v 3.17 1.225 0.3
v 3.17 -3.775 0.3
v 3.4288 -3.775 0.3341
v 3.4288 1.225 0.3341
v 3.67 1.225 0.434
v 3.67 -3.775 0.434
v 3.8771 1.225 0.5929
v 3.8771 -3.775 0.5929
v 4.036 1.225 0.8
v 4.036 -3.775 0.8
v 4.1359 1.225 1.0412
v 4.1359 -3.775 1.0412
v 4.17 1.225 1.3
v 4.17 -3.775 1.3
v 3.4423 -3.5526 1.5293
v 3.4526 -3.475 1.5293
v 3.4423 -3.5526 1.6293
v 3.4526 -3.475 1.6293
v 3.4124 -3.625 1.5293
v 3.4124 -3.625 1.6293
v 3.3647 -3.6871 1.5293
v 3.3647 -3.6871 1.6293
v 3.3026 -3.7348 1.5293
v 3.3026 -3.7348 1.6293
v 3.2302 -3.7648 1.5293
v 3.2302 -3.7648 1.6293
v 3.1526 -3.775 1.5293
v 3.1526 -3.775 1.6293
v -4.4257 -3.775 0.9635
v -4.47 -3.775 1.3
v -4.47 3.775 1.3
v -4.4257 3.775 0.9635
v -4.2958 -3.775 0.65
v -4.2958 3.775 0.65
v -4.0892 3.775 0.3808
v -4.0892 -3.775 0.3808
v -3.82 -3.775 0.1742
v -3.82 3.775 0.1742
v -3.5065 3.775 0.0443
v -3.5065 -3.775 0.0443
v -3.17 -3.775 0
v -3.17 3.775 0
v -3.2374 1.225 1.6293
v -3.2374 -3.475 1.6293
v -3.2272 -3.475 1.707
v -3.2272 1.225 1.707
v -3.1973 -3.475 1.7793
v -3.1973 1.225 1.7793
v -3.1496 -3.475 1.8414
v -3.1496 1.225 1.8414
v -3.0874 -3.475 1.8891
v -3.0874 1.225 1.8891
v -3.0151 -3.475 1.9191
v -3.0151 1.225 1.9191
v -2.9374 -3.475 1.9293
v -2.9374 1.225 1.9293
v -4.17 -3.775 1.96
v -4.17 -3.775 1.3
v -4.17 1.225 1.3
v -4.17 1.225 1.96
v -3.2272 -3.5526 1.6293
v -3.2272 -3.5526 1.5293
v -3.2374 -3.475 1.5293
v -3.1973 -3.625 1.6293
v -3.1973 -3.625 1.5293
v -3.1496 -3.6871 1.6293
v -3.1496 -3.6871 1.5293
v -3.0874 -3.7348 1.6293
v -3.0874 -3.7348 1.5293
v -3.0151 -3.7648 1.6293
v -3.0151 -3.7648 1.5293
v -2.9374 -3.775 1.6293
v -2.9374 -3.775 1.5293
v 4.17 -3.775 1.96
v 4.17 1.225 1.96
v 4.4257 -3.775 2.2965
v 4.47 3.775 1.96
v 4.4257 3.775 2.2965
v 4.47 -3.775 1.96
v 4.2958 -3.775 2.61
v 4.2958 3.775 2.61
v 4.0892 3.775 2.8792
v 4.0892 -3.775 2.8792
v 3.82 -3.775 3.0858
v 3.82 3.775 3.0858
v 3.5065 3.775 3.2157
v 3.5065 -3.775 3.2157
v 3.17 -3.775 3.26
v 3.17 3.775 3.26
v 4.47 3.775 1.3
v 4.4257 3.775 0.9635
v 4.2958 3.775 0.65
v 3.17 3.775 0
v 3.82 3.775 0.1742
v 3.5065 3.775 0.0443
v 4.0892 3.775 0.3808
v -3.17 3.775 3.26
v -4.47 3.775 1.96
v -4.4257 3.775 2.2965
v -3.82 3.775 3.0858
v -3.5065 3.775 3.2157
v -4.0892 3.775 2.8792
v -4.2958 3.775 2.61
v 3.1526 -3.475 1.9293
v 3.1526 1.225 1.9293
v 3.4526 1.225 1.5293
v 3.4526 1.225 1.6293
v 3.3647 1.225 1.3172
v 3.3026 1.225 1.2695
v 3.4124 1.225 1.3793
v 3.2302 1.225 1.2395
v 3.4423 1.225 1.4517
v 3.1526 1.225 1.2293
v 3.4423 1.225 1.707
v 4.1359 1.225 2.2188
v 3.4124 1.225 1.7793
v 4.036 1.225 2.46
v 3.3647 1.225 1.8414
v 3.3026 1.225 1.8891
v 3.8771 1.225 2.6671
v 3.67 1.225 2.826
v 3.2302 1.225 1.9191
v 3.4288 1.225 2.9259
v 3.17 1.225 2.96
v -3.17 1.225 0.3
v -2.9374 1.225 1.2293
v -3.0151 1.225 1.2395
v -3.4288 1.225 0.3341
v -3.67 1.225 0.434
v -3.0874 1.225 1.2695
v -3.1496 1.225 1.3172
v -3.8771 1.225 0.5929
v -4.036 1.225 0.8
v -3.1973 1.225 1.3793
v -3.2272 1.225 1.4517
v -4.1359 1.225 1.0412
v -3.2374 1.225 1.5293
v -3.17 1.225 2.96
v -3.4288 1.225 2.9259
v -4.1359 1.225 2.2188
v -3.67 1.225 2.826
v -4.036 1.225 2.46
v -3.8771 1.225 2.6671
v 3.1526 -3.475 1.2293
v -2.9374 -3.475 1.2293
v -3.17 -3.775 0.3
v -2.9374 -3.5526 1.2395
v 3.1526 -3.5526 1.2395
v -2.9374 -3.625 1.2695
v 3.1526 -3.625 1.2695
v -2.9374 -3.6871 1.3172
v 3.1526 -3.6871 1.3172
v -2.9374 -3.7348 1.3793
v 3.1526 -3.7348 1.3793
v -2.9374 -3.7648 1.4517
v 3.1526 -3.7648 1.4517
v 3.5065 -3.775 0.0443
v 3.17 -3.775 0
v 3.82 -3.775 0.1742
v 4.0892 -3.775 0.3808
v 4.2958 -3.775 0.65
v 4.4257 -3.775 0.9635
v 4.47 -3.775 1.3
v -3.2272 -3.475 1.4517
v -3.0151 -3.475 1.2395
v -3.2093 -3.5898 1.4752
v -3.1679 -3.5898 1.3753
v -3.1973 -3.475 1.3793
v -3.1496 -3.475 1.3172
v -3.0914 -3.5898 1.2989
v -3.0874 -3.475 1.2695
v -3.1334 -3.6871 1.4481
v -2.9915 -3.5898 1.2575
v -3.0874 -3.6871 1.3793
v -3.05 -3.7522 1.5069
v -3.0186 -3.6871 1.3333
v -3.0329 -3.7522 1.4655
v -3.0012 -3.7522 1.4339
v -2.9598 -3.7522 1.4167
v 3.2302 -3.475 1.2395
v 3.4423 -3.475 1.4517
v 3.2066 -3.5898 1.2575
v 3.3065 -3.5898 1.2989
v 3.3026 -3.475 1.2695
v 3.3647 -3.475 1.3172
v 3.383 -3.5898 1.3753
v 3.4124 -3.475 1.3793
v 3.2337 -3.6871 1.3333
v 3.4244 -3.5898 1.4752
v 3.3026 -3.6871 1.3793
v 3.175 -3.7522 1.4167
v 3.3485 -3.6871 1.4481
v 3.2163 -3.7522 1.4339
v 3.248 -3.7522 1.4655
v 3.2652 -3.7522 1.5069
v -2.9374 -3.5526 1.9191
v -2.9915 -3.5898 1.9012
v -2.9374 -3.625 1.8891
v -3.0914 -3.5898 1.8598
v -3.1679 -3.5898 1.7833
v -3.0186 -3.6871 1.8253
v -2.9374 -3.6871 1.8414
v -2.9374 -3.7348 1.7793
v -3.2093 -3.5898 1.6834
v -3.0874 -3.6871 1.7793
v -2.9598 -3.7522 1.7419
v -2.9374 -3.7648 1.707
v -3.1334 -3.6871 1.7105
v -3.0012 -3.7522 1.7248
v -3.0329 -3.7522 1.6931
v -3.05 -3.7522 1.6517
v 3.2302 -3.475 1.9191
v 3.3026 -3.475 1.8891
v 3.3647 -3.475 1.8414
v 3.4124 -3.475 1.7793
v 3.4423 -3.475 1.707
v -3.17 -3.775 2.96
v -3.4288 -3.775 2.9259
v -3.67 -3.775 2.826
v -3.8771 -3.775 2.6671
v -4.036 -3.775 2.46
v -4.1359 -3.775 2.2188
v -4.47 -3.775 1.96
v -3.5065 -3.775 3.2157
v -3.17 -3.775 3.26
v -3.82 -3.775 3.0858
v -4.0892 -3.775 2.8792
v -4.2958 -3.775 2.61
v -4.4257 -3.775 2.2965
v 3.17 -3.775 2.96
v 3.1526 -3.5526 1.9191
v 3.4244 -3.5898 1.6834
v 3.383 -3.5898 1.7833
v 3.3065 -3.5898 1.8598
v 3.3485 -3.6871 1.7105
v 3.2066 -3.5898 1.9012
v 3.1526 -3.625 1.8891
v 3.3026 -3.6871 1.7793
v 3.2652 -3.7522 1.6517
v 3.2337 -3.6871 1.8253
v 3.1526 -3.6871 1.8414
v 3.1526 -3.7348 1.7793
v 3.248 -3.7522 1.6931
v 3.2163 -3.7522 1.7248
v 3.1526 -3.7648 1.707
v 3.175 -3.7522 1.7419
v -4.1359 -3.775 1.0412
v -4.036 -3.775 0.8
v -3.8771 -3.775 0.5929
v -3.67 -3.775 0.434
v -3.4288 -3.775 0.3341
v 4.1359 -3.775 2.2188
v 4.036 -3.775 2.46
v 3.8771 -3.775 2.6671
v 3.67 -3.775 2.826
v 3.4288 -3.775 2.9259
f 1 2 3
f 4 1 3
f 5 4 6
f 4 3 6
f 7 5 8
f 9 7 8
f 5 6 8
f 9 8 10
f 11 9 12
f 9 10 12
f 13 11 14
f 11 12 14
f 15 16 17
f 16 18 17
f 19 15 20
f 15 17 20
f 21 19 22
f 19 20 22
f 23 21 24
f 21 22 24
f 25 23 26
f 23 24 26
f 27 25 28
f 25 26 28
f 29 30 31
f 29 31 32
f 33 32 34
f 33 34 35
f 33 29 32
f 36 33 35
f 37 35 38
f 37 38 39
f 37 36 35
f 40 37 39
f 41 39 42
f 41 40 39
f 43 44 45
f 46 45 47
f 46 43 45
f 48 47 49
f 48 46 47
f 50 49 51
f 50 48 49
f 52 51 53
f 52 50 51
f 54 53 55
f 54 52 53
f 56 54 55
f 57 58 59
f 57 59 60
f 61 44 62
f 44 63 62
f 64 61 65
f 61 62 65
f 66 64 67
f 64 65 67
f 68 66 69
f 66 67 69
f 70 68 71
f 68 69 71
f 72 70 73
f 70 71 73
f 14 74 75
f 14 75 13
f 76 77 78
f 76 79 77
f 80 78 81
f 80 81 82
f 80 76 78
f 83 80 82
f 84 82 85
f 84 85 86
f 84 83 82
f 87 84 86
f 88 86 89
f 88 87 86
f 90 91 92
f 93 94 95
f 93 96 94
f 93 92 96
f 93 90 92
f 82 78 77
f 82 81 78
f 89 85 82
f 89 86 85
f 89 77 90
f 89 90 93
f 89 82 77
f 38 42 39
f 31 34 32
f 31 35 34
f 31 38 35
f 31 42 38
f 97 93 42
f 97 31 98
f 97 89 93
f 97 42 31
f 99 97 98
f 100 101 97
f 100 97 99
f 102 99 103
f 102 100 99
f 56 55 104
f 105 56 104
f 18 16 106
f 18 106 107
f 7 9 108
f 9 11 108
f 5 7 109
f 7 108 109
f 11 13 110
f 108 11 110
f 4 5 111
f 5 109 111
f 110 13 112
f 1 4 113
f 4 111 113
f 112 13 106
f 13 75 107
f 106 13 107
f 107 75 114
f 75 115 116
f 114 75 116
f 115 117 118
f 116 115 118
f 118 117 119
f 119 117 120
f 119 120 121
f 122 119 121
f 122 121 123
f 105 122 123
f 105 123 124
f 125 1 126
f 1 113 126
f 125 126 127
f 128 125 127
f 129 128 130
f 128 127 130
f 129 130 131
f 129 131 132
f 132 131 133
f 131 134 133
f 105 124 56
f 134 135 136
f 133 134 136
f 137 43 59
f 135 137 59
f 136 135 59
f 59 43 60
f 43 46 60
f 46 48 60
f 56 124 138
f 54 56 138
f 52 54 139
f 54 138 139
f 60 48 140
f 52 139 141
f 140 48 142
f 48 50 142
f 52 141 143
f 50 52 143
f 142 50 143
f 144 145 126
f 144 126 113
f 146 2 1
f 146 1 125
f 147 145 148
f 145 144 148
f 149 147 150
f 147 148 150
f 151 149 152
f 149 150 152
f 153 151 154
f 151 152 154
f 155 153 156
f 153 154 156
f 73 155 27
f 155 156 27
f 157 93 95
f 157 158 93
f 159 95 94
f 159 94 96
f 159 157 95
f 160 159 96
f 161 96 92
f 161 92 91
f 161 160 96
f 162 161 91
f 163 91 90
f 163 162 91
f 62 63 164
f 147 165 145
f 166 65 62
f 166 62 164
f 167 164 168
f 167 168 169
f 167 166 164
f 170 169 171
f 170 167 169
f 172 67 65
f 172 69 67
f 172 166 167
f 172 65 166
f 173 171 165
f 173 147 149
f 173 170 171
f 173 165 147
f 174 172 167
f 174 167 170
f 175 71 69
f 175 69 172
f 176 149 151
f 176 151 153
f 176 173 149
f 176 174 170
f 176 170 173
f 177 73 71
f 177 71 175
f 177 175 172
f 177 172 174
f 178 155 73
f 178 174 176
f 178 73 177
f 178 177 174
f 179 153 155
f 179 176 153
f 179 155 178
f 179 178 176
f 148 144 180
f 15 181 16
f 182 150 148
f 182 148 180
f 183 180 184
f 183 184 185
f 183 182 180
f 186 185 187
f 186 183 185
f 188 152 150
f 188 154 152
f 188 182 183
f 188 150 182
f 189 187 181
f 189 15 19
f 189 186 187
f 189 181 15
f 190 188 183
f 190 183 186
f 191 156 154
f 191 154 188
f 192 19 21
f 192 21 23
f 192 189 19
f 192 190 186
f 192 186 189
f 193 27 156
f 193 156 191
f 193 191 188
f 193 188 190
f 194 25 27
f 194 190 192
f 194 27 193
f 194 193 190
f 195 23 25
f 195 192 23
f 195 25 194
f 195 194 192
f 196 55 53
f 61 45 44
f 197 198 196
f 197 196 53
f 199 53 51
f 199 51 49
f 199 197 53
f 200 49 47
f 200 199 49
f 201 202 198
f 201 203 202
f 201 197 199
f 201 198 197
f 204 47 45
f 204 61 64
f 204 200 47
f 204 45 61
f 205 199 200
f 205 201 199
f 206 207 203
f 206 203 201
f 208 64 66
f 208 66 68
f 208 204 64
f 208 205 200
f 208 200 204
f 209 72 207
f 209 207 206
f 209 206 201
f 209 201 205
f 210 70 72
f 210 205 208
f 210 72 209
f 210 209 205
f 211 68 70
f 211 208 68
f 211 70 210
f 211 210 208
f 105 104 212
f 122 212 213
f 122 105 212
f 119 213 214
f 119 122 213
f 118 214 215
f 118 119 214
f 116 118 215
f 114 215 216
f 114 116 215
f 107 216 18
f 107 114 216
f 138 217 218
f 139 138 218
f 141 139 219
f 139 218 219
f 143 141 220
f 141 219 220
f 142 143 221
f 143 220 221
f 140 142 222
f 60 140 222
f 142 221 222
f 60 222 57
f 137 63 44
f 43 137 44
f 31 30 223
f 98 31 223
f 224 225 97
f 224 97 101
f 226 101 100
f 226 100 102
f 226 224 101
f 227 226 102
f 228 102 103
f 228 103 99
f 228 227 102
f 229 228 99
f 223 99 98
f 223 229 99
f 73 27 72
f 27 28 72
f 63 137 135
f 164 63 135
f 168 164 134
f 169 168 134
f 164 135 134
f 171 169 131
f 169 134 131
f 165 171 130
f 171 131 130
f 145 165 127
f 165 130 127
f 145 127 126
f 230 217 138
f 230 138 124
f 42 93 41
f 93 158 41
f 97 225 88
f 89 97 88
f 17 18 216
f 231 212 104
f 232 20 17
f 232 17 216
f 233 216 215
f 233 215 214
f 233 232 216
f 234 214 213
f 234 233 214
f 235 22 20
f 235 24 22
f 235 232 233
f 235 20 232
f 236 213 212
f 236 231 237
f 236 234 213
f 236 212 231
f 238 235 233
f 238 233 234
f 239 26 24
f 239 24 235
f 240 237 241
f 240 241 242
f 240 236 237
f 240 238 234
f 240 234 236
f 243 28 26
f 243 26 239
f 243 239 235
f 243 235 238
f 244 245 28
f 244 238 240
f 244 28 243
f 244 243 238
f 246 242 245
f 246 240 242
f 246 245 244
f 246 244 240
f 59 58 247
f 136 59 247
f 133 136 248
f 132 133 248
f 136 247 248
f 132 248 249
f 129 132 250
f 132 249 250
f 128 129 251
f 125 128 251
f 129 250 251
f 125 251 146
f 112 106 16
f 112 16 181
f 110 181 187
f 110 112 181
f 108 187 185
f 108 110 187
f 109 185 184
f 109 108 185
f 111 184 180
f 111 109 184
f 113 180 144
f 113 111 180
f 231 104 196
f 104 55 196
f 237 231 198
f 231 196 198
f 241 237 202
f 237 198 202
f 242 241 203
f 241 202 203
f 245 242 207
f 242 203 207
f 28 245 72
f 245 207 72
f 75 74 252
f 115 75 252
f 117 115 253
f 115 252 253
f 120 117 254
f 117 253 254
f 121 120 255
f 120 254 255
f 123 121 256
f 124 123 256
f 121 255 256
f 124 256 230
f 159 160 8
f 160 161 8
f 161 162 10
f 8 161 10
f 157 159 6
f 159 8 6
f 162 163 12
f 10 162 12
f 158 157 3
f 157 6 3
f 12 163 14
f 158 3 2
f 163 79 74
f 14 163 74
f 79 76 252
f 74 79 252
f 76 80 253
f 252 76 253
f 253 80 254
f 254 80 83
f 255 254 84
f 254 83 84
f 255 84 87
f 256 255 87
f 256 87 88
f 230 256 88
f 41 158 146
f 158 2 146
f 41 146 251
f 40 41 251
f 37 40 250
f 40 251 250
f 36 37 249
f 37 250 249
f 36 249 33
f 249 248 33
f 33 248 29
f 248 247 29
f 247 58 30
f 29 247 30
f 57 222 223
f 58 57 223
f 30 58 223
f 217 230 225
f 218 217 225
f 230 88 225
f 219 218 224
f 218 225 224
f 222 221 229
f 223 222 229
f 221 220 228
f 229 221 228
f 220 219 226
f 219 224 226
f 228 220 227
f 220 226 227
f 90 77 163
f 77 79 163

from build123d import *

# Parameters (mm, degrees)
PAD_DEPTH    = 3.775
SKETCH001_W  = 6.69
SKETCH001_H  = 0.7
POCKET_DEPTH = 5
FILLET_R     = 0.3
FILLET001_R  = 0.3


with BuildPart() as part:
    # Sketch → Pad (new body, symmetric)
    with BuildSketch(Plane.XZ):
        with BuildLine():
            Line((-3.17, 3.26), (3.17, 3.26))
            ThreePointArc((4.47, 1.96), (4.089239, 2.879239), (3.17, 3.26))
            Line((4.47, 1.96), (4.47, 1.3))
            ThreePointArc((3.17, 0), (4.089239, 0.380761), (4.47, 1.3))
            Line((3.17, 0), (-3.17, 0))
            ThreePointArc((-4.47, 1.3), (-4.089239, 0.380761), (-3.17, 0))
            Line((-4.47, 1.3), (-4.47, 1.96))
            ThreePointArc((-3.17, 3.26), (-4.089239, 2.879239), (-4.47, 1.96))
        make_face()
    extrude(amount=PAD_DEPTH, both=True)

    # Sketch001 (on Face10 of Pad) → Pocket (cut)
    with BuildSketch(Plane.XZ.offset(3.775)):
        with BuildLine():
            Line((-3.17, 2.96), (3.17, 2.96))
            ThreePointArc((4.17, 1.96), (3.877107, 2.667107), (3.17, 2.96))
            Line((4.17, 1.96), (4.17, 1.3))
            ThreePointArc((3.17, 0.3), (3.877107, 0.592893), (4.17, 1.3))
            Line((3.17, 0.3), (-3.17, 0.3))
            ThreePointArc((-4.17, 1.3), (-3.877107, 0.592893), (-3.17, 0.3))
            Line((-4.17, 1.3), (-4.17, 1.96))
            ThreePointArc((-3.17, 2.96), (-3.877107, 2.667107), (-4.17, 1.96))
        make_face()
        with Locations((0.107557, 1.579315)):
            Rectangle(SKETCH001_W, SKETCH001_H, mode=Mode.SUBTRACT)
    extrude(amount=-POCKET_DEPTH, mode=Mode.SUBTRACT)

    # Fillet
    fillet_edges = [part.edges().sort_by_distance(p)[0] for p in [
        (3.452557, -1.275, 1.229315),
        (3.452557, -1.275, 1.929315),
        (-3.237443, -1.275, 1.929315),
        (-3.237443, -1.275, 1.229315),
    ]]
    fillet(fillet_edges, radius=FILLET_R)

    # Fillet001
    fillet001_edges = [part.edges().sort_by_distance(p)[0] for p in [
        (0.107557, -3.775, 1.229315),
        (3.364689, -3.775, 1.317183),
        (-3.149575, -3.775, 1.317183),
        (3.452557, -3.775, 1.579315),
        (-3.237443, -3.775, 1.579315),
        (3.364689, -3.775, 1.841447),
        (-3.149575, -3.775, 1.841447),
        (0.107557, -3.775, 1.929315),
    ]]
    fillet(fillet001_edges, radius=FILLET001_R)


solid = part.part
